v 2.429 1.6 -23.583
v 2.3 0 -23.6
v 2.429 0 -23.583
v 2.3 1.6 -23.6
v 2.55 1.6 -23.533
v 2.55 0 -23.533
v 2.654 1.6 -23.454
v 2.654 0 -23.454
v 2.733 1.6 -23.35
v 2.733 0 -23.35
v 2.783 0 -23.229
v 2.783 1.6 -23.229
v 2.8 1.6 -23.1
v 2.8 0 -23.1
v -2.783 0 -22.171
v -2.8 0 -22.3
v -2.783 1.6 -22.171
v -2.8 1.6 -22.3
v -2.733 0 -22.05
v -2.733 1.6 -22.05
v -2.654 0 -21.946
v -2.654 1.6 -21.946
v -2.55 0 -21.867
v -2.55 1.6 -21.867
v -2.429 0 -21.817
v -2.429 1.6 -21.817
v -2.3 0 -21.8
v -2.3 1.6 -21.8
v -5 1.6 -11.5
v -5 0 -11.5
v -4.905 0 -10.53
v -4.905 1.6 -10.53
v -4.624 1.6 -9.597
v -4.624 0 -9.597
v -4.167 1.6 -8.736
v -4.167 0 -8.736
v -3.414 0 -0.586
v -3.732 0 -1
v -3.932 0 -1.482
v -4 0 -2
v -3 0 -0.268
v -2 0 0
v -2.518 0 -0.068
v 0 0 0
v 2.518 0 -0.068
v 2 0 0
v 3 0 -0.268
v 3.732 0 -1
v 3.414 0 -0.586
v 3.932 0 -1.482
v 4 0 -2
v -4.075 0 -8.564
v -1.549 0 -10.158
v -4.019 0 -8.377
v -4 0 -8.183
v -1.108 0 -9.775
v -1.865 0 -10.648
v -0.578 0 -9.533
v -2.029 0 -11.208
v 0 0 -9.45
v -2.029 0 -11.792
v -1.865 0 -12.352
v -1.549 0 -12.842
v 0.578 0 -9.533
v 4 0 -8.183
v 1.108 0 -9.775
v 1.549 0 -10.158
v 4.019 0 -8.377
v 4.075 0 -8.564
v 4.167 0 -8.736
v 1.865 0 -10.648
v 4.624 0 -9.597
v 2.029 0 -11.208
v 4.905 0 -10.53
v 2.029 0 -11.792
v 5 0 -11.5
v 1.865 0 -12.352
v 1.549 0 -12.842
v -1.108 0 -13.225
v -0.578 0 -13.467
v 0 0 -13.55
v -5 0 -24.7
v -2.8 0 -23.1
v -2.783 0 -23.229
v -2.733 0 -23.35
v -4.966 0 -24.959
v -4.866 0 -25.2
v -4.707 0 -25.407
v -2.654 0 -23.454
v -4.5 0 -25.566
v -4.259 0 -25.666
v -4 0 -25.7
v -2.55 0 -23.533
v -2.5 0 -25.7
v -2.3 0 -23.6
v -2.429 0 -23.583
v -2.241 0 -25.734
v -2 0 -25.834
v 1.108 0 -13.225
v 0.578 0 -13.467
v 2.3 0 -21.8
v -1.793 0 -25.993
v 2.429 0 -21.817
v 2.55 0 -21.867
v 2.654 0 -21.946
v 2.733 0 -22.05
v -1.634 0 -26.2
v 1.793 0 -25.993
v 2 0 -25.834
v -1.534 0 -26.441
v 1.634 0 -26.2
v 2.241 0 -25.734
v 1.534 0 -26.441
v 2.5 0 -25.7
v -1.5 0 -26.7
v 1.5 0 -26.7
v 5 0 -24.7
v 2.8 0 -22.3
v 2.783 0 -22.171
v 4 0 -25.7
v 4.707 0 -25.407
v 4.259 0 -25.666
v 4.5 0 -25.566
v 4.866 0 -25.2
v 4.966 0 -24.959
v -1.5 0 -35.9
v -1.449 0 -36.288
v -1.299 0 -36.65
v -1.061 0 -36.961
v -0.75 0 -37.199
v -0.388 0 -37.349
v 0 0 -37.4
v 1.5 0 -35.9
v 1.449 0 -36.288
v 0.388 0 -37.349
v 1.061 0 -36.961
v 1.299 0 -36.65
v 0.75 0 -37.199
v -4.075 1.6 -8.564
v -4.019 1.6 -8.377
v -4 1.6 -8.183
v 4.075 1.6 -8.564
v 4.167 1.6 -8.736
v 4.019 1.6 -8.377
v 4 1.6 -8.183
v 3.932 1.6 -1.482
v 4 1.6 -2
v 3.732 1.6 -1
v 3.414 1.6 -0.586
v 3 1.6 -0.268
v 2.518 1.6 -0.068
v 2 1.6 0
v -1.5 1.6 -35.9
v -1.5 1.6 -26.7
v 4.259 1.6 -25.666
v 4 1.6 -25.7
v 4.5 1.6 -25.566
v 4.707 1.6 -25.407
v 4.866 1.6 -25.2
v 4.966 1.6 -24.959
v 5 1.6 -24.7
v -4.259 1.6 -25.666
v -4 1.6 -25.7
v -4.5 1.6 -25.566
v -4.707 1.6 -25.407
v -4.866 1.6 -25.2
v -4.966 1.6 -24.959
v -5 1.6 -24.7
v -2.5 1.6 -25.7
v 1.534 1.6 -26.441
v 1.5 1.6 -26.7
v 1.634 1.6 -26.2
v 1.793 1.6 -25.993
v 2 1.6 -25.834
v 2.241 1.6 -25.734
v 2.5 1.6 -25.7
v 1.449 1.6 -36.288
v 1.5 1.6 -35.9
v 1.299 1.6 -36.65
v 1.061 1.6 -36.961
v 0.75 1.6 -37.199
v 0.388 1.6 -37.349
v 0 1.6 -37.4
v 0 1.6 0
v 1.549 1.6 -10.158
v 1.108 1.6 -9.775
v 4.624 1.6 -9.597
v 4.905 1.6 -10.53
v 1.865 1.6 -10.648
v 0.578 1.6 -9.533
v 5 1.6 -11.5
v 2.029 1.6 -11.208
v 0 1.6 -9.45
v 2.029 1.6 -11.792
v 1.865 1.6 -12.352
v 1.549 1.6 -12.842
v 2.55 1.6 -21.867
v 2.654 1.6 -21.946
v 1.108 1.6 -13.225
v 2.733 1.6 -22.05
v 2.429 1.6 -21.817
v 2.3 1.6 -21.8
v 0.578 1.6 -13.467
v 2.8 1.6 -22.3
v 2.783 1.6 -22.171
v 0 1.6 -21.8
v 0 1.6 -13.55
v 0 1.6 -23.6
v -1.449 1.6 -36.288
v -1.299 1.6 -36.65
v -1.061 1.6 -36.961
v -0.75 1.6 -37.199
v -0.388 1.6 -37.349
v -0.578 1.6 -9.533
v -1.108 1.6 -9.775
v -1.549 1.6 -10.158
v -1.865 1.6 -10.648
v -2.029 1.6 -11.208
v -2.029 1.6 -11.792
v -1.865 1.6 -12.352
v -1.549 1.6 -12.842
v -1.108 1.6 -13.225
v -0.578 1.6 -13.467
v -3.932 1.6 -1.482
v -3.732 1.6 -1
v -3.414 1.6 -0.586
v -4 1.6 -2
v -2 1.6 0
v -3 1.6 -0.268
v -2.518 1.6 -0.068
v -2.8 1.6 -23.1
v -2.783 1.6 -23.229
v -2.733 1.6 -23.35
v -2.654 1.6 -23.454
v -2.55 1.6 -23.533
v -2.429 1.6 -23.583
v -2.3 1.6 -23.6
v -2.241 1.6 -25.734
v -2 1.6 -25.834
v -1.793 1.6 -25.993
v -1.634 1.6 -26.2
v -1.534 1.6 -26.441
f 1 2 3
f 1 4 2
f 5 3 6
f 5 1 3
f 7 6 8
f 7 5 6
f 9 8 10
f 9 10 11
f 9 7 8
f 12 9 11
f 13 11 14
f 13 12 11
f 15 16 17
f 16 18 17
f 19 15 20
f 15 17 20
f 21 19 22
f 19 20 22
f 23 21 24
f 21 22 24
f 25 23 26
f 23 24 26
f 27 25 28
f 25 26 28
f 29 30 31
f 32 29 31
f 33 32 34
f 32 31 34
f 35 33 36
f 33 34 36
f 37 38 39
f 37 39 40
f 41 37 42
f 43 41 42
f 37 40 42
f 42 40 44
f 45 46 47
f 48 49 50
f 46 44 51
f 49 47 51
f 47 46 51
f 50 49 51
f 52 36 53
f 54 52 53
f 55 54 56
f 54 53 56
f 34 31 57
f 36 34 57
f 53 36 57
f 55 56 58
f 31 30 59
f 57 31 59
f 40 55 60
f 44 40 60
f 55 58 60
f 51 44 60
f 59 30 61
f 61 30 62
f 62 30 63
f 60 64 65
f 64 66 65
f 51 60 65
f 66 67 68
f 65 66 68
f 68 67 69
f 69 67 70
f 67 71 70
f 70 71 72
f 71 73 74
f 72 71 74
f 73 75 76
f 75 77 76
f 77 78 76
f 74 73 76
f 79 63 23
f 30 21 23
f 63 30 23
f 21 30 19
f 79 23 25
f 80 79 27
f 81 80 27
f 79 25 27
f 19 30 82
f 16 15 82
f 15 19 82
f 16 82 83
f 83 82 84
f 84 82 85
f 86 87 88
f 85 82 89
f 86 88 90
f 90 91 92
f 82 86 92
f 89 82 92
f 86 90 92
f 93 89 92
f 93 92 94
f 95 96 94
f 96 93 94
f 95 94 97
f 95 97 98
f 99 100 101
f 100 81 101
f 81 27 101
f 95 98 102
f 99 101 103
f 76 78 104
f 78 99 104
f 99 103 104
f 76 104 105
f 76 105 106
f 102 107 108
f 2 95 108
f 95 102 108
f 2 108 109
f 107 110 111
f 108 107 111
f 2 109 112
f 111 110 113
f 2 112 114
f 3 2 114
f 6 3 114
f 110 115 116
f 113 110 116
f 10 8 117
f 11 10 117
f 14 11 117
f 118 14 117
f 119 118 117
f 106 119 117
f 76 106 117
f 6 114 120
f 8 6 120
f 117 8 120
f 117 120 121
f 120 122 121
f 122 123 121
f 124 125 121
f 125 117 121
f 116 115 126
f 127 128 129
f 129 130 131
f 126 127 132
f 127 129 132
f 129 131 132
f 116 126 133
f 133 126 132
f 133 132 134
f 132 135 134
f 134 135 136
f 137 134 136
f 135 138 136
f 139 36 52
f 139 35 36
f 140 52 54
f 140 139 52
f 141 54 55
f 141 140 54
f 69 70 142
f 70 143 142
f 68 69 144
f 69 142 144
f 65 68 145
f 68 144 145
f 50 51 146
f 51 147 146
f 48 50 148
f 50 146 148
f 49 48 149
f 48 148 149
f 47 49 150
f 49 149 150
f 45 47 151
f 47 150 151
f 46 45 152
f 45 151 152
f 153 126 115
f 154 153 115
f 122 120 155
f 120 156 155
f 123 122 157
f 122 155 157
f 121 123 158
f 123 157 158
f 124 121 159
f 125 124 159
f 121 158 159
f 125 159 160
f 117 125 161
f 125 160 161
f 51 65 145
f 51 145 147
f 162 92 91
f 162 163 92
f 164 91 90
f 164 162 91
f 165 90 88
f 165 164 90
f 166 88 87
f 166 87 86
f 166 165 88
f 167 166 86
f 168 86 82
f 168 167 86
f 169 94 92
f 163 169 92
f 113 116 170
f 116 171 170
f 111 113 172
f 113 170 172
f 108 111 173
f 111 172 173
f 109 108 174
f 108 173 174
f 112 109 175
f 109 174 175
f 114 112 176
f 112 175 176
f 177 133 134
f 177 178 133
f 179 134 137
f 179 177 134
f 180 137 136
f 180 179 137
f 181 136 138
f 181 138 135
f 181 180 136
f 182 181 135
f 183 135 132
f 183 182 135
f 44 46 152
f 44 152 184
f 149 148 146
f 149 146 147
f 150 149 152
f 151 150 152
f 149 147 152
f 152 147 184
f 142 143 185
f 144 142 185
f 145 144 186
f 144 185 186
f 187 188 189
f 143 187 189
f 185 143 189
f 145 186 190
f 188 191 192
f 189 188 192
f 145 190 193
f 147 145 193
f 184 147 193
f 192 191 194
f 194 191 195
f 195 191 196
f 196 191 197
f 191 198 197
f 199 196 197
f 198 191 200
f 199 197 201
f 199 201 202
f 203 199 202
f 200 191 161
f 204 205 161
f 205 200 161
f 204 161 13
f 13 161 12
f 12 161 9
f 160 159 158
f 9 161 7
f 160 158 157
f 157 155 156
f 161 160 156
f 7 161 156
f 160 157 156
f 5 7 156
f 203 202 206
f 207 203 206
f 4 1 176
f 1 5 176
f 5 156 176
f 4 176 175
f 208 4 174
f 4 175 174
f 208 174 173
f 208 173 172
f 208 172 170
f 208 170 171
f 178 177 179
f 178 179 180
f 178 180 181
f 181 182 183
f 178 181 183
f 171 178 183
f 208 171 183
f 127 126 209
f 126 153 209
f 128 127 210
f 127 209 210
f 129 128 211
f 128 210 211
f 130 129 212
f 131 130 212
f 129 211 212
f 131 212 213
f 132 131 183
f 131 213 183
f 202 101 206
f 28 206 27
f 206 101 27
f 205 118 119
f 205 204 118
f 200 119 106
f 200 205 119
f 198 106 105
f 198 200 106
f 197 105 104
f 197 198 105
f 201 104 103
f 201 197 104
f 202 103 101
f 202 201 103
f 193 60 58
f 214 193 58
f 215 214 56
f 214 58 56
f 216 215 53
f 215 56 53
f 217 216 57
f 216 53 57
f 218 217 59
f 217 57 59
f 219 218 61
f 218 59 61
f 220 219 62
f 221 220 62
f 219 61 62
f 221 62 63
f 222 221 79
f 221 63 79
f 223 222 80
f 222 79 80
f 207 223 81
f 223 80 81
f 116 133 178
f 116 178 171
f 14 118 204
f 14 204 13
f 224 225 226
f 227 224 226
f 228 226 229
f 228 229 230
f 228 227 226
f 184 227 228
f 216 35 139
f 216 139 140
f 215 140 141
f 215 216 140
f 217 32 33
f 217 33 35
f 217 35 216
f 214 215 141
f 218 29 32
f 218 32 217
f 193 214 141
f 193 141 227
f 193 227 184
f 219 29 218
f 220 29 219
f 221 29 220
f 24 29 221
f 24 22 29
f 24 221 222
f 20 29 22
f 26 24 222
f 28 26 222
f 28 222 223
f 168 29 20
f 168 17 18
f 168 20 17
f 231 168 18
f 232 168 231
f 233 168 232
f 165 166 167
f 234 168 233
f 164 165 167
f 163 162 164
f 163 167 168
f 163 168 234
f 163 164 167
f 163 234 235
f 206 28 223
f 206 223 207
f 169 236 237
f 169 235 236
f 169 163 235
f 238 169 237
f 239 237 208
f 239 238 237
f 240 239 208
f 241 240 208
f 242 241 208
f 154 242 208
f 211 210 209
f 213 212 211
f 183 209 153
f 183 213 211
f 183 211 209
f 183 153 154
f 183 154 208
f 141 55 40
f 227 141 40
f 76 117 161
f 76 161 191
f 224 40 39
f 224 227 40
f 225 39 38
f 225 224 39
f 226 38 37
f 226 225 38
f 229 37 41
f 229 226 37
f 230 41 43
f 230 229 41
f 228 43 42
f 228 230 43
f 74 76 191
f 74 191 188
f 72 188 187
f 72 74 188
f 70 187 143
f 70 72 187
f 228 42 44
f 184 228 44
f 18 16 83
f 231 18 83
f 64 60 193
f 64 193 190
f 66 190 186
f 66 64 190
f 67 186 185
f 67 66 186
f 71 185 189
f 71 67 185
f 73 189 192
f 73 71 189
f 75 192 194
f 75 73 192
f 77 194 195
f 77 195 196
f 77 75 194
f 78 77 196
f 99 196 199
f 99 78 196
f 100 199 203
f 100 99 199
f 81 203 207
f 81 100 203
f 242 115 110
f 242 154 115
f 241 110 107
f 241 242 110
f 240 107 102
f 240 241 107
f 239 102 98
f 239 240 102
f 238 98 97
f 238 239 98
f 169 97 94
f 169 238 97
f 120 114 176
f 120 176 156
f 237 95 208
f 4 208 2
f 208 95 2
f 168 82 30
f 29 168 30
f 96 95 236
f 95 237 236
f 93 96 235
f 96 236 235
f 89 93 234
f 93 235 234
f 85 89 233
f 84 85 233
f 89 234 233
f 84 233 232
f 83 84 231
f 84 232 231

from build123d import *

# Parameters (mm, degrees)
EXTRUDE_1_DEPTH = 1.6
FILLET_1_R      = 2
FILLET_2_R      = 1.5
FILLET_3_R      = 1
FILLET_4_R      = 0.5


with BuildPart() as part:
    # 草图1 → 凸台-拉伸1 (new body)
    with BuildSketch(Plane(origin=(0, 0, 0), x_dir=(1, 0, 0), z_dir=(0, 1, 0))):
        with BuildLine():
            Line((0, 37.4), (1.5, 37.4))
            Line((1.5, 37.4), (1.5, 25.7))
            Line((1.5, 25.7), (5, 25.7))
            Line((5, 25.7), (5, 11.5))
            ThreePointArc((5, 11.5), (4.74341649, 9.91886117), (4, 8.5))
            Line((4, 8.5), (4, 0))
            Line((4, 0), (0, 0))
            Line((0, 0), (0, 9.45))
            ThreePointArc((0, 9.45), (2.05, 11.5), (0, 13.55))
            Line((0, 13.55), (0, 21.8))
            Line((0, 21.8), (2.8, 21.8))
            Line((2.8, 21.8), (2.8, 23.6))
            Line((2.8, 23.6), (0, 23.6))
            Line((0, 23.6), (0, 37.4))
        make_face()
    extrude(amount=EXTRUDE_1_DEPTH)

    # 圆角1
    fillet_1_edges = [part.edges().sort_by_distance(p)[0] for p in [
        (4, 0.8, 0),
    ]]
    fillet(fillet_1_edges, radius=FILLET_1_R)

    # 圆角2
    fillet_2_edges = [part.edges().sort_by_distance(p)[0] for p in [
        (1.5, 0.8, -37.4),
    ]]
    fillet(fillet_2_edges, radius=FILLET_2_R - 0.0001)  # a hair under: the kernel refuses the full size

    # 圆角3
    fillet_3_edges = [part.edges().sort_by_distance(p)[0] for p in [
        (1.5, 0.8, -25.7),
        (5, 0.8, -25.7),
        (4, 0.8, -8.5),
    ]]
    fillet(fillet_3_edges, radius=FILLET_3_R)

    # 圆角4
    fillet_4_edges = [part.edges().sort_by_distance(p)[0] for p in [
        (2.8, 0.8, -21.8),
        (2.8, 0.8, -23.6),
    ]]
    fillet(fillet_4_edges, radius=FILLET_4_R)

    # 镜向1: part across plane


with BuildPart() as part_1:
    add(part.part)
    add(part.part.mirror(Plane(origin=(0, 1.6, -37.4), x_dir=(0, 0, 1), z_dir=(1, 0, 0))))


solid = part_1.part
